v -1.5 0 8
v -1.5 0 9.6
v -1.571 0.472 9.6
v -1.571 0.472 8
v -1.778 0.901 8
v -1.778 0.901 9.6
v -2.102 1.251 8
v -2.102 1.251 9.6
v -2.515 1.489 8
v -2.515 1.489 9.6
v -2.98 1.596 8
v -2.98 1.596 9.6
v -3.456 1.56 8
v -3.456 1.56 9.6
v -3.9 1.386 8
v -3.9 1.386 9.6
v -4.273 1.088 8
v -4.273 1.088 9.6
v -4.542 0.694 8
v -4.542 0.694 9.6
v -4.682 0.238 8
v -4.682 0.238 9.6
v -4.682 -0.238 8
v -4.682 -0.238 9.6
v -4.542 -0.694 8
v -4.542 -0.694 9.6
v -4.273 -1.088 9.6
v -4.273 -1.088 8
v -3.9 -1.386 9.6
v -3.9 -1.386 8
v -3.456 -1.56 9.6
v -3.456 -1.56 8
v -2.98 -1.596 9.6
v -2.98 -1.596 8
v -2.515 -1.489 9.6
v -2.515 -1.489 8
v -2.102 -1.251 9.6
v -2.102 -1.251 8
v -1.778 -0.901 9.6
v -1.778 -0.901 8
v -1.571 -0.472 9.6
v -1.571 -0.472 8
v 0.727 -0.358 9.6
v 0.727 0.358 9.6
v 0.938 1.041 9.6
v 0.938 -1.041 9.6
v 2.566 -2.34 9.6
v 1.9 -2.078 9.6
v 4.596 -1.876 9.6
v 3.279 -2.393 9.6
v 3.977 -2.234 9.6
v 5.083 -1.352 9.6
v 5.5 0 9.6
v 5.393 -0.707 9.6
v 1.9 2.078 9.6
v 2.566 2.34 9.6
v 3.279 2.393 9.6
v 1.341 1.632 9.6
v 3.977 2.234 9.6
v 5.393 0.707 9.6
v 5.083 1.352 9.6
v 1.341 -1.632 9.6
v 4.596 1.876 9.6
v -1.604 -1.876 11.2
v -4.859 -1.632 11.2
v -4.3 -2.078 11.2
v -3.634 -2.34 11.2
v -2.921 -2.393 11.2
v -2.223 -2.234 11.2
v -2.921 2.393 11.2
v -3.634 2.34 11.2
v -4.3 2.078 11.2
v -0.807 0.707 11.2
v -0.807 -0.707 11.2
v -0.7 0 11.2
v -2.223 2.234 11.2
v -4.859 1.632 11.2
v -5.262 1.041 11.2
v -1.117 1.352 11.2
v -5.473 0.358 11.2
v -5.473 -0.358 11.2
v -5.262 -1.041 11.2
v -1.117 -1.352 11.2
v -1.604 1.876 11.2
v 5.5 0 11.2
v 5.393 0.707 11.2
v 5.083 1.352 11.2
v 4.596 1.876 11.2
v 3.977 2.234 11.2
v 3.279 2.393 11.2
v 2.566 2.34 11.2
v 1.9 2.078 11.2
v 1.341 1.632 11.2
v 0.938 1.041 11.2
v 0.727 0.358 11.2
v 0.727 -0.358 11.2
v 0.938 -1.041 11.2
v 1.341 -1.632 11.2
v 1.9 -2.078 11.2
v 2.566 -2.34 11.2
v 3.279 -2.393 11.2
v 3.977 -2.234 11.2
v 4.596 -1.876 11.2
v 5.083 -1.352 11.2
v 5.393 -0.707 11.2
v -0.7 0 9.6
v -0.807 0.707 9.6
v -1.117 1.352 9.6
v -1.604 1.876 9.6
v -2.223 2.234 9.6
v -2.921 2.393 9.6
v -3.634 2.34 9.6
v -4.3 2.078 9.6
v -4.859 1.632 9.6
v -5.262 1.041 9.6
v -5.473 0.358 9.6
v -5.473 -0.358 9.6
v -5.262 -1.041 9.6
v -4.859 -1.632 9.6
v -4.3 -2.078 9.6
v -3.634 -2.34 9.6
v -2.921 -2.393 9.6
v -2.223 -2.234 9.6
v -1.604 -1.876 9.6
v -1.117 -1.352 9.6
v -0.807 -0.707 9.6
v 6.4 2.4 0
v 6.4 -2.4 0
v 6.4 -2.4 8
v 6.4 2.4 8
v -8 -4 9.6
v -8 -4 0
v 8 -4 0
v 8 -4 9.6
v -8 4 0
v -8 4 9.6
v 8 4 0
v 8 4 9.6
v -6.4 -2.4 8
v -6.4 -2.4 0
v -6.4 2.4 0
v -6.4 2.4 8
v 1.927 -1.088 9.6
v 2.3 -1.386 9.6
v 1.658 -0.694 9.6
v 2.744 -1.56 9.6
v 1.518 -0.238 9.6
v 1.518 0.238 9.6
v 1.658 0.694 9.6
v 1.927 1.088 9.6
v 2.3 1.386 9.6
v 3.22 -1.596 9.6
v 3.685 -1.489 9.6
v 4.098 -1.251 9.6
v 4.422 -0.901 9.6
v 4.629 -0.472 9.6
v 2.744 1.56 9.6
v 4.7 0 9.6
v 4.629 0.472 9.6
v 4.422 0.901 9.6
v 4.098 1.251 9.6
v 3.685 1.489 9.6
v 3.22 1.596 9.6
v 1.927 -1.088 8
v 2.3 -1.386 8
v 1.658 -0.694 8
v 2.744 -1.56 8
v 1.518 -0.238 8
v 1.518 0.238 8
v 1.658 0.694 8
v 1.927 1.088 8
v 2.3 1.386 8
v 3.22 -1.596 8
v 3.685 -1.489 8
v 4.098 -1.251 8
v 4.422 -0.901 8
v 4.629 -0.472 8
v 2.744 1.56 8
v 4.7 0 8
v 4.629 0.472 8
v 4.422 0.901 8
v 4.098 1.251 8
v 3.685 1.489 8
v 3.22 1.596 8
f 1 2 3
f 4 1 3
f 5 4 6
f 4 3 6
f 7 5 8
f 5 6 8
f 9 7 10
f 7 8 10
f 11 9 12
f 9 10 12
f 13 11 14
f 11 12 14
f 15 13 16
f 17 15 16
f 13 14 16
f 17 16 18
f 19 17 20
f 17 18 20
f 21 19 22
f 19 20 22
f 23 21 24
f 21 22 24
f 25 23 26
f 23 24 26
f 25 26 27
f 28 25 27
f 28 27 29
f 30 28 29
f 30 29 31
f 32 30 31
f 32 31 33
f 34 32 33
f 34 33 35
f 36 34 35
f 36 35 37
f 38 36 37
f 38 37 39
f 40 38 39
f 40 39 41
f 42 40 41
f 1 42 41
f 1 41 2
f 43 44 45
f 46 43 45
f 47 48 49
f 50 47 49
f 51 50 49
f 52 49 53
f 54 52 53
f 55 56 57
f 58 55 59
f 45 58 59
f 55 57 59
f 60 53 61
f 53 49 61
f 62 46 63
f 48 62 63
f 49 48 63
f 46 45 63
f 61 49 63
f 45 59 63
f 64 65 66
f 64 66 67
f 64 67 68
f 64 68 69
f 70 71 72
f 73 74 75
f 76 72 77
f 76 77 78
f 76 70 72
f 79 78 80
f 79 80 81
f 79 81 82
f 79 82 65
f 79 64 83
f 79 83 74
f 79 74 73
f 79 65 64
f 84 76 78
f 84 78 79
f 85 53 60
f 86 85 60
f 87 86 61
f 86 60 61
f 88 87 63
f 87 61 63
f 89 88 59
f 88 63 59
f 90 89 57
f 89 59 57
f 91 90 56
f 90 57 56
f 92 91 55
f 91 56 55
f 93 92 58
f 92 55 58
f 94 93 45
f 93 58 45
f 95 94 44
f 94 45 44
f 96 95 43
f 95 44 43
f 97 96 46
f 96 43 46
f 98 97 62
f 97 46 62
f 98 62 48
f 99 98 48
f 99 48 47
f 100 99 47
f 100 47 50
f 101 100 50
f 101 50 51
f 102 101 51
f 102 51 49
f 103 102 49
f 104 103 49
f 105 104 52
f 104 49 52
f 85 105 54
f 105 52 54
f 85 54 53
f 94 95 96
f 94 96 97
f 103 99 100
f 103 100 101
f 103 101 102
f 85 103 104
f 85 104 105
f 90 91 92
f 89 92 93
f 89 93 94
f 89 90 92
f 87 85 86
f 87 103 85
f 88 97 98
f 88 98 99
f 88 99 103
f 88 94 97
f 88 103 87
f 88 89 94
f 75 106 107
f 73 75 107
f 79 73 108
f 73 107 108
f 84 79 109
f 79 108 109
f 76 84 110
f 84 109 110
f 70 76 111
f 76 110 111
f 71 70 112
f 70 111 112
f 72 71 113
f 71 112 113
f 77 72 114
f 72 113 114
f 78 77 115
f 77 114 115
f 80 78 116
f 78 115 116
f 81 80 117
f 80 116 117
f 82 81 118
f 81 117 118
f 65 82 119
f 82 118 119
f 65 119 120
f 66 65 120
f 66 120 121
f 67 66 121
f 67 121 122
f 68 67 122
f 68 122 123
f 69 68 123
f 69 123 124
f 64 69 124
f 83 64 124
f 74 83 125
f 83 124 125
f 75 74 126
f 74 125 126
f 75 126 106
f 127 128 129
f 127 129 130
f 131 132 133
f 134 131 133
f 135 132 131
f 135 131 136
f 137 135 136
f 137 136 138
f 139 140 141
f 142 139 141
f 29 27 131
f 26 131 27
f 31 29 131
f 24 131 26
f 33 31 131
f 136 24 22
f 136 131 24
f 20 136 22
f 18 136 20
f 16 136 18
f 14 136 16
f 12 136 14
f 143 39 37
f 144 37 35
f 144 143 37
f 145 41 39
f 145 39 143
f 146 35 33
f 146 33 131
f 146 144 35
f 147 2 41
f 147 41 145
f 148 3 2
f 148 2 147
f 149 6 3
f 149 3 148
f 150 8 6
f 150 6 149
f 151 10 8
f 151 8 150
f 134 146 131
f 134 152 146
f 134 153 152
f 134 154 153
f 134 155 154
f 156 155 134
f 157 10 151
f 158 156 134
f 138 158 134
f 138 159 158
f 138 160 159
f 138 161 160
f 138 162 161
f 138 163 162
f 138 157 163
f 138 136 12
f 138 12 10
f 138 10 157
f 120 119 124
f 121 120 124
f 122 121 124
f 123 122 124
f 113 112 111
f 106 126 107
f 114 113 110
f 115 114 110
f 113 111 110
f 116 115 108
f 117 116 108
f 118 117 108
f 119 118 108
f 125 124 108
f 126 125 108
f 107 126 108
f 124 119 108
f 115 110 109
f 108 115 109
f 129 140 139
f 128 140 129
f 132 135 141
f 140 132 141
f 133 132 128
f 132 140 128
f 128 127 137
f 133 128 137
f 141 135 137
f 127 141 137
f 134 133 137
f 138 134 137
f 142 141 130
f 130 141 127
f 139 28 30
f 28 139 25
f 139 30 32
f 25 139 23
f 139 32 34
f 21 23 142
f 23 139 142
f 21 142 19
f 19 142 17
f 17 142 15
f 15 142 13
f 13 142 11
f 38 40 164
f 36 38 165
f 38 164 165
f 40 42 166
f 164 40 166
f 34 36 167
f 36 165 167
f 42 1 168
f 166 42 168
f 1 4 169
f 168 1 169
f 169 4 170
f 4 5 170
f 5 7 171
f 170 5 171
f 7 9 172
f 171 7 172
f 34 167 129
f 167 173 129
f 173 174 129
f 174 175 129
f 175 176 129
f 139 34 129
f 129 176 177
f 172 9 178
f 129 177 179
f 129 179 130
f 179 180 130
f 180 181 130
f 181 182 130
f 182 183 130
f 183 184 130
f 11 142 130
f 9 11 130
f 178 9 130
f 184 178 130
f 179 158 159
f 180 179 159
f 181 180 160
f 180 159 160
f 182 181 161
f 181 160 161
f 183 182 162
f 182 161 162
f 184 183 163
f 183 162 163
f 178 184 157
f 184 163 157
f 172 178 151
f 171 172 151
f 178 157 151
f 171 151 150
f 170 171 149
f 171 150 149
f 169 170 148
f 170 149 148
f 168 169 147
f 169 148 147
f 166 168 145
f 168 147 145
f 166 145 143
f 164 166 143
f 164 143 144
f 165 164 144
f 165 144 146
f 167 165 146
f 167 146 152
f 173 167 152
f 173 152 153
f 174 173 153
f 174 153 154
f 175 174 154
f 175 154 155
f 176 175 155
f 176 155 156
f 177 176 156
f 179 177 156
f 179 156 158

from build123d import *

# Parameters (mm, degrees)
F0_W     = 16
F0_H     = 8
F0_W_2   = 12.8
F0_H_2   = 4.8
F1_DEPTH = 9.6
F2_DEPTH = 8
F3_R     = 1.6
F4_DEPTH = 3.2
F5_R     = 2.4
F6_DEPTH = 1.6


# Not quite as in the source:
# - the program builds the solid bodies; features that only make, move or delete a surface that nothing else refers to are left out


with BuildPart() as f1:
    # F0 (on Top) → F1 (new body)
    with BuildSketch(Plane.XY):
        Rectangle(F0_W, F0_H)
        Rectangle(F0_W_2, F0_H_2, mode=Mode.SUBTRACT)
        Rectangle(F0_W_2, F0_H_2)
    extrude(amount=F1_DEPTH)

    # F0 (on Top) → F2 (cut)
    with BuildSketch(Plane.XY):
        Rectangle(F0_W_2, F0_H_2)
    extrude(amount=F2_DEPTH, mode=Mode.SUBTRACT)

    # F3 (on face) → F4 (cut)
    with BuildSketch(Plane.XY.offset(9.6)):
        with Locations((-3.1, 0)):
            Circle(F3_R)
        with Locations((3.1, 0)):
            Circle(F3_R)
    extrude(amount=-F4_DEPTH, mode=Mode.SUBTRACT)


with BuildPart() as f6:
    # F5 (on face) → F6 (new body)
    with BuildSketch(Plane.XY.offset(9.6)):
        with Locations((-3.1, 0)):
            Circle(F5_R)
    extrude(amount=F6_DEPTH)


with BuildPart() as f6b:
    # F5 (on face) → F6, piece 2 (new body)
    with BuildSketch(Plane.XY.offset(9.6)):
        with Locations((3.1, 0)):
            Circle(F5_R)
    extrude(amount=F6_DEPTH)


solid = Compound([f1.part, f6.part, f6b.part])
